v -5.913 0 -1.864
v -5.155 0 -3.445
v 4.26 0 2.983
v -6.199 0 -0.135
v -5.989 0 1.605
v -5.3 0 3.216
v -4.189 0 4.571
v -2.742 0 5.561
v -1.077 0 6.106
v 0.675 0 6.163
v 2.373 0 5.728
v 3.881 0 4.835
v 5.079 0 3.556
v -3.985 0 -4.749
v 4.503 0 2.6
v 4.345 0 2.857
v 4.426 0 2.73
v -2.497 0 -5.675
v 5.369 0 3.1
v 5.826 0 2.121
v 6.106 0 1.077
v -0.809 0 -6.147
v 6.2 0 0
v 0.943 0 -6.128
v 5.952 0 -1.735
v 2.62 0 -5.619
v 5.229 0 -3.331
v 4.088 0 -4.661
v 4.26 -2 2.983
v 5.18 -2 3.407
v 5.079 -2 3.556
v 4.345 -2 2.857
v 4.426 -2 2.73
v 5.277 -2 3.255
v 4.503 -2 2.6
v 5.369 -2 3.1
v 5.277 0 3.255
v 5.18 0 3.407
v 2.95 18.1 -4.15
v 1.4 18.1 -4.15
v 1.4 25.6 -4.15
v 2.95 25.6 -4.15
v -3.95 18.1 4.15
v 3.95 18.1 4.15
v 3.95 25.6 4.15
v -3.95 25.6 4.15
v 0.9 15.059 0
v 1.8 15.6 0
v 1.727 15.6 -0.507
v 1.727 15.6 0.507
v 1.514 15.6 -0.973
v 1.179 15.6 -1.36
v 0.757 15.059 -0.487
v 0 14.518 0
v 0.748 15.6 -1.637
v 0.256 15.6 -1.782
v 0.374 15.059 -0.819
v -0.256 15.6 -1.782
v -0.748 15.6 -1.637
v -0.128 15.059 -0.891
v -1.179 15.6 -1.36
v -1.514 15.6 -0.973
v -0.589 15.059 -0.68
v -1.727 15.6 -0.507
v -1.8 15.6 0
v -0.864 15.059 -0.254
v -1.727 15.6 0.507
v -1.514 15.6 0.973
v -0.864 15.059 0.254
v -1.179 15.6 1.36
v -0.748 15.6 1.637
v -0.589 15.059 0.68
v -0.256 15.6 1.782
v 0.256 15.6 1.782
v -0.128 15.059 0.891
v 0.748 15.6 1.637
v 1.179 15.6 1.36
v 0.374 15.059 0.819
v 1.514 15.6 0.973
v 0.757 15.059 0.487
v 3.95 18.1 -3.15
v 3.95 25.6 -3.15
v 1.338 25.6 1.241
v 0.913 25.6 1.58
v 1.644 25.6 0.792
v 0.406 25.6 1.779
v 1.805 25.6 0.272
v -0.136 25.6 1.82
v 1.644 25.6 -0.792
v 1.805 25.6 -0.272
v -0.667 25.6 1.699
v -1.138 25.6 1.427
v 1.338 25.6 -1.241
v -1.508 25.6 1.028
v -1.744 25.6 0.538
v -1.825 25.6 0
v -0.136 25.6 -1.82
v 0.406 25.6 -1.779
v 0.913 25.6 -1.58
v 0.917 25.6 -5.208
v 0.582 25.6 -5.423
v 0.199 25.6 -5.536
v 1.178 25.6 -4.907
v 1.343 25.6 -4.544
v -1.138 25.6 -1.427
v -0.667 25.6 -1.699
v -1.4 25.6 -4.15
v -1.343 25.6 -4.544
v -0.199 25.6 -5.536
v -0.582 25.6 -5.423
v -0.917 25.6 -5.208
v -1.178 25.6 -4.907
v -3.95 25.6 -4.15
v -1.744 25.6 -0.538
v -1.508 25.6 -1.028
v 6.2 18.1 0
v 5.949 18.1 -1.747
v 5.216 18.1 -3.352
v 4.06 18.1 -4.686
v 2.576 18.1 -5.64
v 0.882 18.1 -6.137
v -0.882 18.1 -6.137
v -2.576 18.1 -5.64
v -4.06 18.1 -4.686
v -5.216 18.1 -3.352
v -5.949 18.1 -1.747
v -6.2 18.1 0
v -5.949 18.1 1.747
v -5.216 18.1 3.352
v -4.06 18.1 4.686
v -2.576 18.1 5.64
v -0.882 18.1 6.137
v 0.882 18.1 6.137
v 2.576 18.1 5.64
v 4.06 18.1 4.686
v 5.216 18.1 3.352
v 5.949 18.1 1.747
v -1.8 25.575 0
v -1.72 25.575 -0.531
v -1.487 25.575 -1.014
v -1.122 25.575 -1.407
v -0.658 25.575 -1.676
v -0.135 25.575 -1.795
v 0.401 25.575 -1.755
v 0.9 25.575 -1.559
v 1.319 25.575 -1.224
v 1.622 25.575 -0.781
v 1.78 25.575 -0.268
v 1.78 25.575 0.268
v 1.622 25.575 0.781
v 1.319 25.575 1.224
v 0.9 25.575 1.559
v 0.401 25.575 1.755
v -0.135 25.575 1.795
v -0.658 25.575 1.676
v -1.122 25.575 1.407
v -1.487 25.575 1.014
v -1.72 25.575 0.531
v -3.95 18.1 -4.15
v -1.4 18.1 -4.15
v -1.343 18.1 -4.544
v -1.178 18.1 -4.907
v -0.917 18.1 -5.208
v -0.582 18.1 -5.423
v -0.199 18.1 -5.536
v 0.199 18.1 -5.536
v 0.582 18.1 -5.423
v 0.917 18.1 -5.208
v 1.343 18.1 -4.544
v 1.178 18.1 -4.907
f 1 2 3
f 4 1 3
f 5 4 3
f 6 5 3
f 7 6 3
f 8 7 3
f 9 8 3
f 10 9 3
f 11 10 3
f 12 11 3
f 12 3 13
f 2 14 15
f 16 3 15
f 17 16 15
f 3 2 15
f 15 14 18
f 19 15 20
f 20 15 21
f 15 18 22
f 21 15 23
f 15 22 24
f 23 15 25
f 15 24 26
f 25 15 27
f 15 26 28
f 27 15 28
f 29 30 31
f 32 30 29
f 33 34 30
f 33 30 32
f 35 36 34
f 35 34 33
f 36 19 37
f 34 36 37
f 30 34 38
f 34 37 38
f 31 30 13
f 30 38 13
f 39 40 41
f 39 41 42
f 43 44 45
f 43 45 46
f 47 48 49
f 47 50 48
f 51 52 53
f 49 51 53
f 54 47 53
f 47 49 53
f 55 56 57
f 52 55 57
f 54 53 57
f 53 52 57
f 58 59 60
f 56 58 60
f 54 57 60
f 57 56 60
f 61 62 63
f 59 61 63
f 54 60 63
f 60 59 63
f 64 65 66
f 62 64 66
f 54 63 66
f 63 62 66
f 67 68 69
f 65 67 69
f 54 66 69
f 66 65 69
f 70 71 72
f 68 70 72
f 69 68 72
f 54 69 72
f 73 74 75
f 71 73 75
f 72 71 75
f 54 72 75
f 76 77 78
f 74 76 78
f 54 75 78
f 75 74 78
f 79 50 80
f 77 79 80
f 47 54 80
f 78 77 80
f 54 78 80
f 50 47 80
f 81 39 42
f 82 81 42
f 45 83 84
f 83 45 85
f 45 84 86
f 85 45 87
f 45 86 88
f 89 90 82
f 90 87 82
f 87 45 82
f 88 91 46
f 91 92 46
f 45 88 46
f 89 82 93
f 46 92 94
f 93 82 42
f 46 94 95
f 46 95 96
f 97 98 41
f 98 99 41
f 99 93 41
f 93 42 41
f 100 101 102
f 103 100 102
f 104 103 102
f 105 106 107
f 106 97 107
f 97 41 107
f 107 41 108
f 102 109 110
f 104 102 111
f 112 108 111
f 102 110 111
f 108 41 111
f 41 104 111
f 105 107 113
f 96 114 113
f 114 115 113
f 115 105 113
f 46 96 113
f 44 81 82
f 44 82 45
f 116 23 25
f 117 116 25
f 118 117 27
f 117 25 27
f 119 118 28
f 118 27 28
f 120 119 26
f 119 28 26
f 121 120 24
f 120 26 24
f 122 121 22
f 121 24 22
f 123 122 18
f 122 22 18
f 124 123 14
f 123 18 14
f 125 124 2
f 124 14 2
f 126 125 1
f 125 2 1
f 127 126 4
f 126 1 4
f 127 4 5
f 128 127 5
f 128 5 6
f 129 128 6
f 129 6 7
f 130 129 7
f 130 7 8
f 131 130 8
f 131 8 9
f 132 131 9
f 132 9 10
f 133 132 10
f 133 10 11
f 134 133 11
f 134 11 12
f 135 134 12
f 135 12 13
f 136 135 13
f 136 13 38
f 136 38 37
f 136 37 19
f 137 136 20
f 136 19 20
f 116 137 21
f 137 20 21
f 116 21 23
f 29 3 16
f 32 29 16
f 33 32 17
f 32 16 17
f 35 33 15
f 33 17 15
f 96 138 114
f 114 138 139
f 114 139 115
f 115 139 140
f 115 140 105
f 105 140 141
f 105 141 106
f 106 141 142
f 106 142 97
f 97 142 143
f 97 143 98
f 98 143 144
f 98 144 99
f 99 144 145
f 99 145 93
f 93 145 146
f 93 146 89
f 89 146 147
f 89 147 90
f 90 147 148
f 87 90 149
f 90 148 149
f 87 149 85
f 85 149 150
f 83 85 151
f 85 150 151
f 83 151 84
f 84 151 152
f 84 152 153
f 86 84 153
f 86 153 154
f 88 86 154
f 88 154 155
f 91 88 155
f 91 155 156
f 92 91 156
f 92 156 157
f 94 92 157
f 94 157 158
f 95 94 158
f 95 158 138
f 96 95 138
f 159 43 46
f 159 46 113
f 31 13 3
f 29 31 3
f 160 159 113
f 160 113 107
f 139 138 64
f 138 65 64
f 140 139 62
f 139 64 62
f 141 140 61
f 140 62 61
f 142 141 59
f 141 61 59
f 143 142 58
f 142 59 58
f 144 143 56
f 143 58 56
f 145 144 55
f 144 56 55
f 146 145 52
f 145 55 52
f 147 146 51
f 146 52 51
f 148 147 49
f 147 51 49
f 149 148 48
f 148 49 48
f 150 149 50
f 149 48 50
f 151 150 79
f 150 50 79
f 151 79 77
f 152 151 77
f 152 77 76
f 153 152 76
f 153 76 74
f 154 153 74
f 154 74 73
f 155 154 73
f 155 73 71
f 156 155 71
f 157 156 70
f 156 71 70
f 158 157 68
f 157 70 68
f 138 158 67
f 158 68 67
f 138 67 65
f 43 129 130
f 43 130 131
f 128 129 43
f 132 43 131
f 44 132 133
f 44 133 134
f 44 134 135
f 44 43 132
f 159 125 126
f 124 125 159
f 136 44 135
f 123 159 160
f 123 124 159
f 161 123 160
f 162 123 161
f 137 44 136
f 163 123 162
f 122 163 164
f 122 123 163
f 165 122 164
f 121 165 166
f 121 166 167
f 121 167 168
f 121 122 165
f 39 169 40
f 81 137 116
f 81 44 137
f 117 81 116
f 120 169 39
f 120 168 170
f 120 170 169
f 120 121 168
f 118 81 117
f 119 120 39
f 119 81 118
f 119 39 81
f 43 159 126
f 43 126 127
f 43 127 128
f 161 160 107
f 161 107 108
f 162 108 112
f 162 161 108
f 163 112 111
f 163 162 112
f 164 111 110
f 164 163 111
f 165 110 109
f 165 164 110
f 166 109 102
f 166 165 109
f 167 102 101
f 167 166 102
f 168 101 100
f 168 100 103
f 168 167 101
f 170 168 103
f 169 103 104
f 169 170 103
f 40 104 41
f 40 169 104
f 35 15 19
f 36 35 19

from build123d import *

# Parameters (mm, degrees)
ESBO_O1_R                              = 6.2
RESSALTO_EXTRUS_O1_DEPTH               = 18.1
RESSALTO_EXTRUS_O2_DEPTH               = 2
RESSALTO_EXTRUS_O3_DEPTH               = 7.5
CHANFRO1_SIZE                          = 1
FURO_DE_DI_METRO_3_6_3_6_1_D           = 3.6
FURO_DE_DI_METRO_3_6_3_6_1_DEPTH       = 10
FURO_DE_DI_METRO_3_6_3_6_1_CSINK_D     = 3.65
FURO_DE_DI_METRO_3_6_3_6_1_CSINK_ANGLE = 90
FURO_DE_DI_METRO_3_6_3_6_1_TIP         = 1.081549114


with BuildPart() as part:
    # Esboço1 → Ressalto-extrusão1 (new body)
    with BuildSketch(Plane(origin=(0, 0, 0), x_dir=(1, 0, 0), z_dir=(0, 1, 0))):
        Circle(ESBO_O1_R)
    extrude(amount=RESSALTO_EXTRUS_O1_DEPTH)

    # Esboço2 → Ressalto-extrusão2 (add)
    with BuildSketch(Plane(origin=(0, 0, 0), x_dir=(1, 0, 0), z_dir=(0, 1, 0))):
        with BuildLine():
            Line((4.5033321, -2.6), (5.369357503, -3.1))
            ThreePointArc((5.369357503, -3.1), (5.229026964, -3.331257572), (5.078742675, -3.556173905))
            Line((5.078742675, -3.556173905), (4.25959063, -2.982597469))
            ThreePointArc((4.25959063, -2.982597469), (4.385635518, -2.793957963), (4.5033321, -2.6))
        make_face()
    extrude(amount=-RESSALTO_EXTRUS_O2_DEPTH)

    # Esboço3 → Ressalto-extrusão3 (add)
    with BuildSketch(Plane(origin=(0, 18.1, 0), x_dir=(1, 0, 0), z_dir=(0, 1, 0))):
        with BuildLine():
            Line((1.4, 4.15), (3.95, 4.15))
            Line((3.95, 4.15), (3.95, -4.15))
            Line((3.95, -4.15), (-3.95, -4.15))
            Line((-3.95, -4.15), (-3.95, 4.15))
            Line((-3.95, 4.15), (-1.4, 4.15))
            ThreePointArc((-1.4, 4.15), (0, 5.55), (1.4, 4.15))
        make_face()
    extrude(amount=RESSALTO_EXTRUS_O3_DEPTH)

    # Chanfro1
    chanfro1_edges = [part.edges().sort_by_distance(p)[0] for p in [
        (3.95, 21.85, -4.15),
    ]]
    chamfer(chanfro1_edges, length=CHANFRO1_SIZE)

    # Furo de diâmetro Ø3.6 (3.6)1
    with Locations(Plane(origin=(0, 25.6, 0), x_dir=(1, 0, 0), z_dir=(0, 1, 0))):
        with Locations((0, 0)):
            CounterSinkHole(FURO_DE_DI_METRO_3_6_3_6_1_D / 2, FURO_DE_DI_METRO_3_6_3_6_1_CSINK_D / 2, depth=FURO_DE_DI_METRO_3_6_3_6_1_DEPTH, counter_sink_angle=FURO_DE_DI_METRO_3_6_3_6_1_CSINK_ANGLE)
            with Locations((0, 0, -(FURO_DE_DI_METRO_3_6_3_6_1_DEPTH + FURO_DE_DI_METRO_3_6_3_6_1_TIP / 2))):  # 118° drill point
                Cone(0, FURO_DE_DI_METRO_3_6_3_6_1_D / 2, FURO_DE_DI_METRO_3_6_3_6_1_TIP, mode=Mode.SUBTRACT)


solid = part.part
